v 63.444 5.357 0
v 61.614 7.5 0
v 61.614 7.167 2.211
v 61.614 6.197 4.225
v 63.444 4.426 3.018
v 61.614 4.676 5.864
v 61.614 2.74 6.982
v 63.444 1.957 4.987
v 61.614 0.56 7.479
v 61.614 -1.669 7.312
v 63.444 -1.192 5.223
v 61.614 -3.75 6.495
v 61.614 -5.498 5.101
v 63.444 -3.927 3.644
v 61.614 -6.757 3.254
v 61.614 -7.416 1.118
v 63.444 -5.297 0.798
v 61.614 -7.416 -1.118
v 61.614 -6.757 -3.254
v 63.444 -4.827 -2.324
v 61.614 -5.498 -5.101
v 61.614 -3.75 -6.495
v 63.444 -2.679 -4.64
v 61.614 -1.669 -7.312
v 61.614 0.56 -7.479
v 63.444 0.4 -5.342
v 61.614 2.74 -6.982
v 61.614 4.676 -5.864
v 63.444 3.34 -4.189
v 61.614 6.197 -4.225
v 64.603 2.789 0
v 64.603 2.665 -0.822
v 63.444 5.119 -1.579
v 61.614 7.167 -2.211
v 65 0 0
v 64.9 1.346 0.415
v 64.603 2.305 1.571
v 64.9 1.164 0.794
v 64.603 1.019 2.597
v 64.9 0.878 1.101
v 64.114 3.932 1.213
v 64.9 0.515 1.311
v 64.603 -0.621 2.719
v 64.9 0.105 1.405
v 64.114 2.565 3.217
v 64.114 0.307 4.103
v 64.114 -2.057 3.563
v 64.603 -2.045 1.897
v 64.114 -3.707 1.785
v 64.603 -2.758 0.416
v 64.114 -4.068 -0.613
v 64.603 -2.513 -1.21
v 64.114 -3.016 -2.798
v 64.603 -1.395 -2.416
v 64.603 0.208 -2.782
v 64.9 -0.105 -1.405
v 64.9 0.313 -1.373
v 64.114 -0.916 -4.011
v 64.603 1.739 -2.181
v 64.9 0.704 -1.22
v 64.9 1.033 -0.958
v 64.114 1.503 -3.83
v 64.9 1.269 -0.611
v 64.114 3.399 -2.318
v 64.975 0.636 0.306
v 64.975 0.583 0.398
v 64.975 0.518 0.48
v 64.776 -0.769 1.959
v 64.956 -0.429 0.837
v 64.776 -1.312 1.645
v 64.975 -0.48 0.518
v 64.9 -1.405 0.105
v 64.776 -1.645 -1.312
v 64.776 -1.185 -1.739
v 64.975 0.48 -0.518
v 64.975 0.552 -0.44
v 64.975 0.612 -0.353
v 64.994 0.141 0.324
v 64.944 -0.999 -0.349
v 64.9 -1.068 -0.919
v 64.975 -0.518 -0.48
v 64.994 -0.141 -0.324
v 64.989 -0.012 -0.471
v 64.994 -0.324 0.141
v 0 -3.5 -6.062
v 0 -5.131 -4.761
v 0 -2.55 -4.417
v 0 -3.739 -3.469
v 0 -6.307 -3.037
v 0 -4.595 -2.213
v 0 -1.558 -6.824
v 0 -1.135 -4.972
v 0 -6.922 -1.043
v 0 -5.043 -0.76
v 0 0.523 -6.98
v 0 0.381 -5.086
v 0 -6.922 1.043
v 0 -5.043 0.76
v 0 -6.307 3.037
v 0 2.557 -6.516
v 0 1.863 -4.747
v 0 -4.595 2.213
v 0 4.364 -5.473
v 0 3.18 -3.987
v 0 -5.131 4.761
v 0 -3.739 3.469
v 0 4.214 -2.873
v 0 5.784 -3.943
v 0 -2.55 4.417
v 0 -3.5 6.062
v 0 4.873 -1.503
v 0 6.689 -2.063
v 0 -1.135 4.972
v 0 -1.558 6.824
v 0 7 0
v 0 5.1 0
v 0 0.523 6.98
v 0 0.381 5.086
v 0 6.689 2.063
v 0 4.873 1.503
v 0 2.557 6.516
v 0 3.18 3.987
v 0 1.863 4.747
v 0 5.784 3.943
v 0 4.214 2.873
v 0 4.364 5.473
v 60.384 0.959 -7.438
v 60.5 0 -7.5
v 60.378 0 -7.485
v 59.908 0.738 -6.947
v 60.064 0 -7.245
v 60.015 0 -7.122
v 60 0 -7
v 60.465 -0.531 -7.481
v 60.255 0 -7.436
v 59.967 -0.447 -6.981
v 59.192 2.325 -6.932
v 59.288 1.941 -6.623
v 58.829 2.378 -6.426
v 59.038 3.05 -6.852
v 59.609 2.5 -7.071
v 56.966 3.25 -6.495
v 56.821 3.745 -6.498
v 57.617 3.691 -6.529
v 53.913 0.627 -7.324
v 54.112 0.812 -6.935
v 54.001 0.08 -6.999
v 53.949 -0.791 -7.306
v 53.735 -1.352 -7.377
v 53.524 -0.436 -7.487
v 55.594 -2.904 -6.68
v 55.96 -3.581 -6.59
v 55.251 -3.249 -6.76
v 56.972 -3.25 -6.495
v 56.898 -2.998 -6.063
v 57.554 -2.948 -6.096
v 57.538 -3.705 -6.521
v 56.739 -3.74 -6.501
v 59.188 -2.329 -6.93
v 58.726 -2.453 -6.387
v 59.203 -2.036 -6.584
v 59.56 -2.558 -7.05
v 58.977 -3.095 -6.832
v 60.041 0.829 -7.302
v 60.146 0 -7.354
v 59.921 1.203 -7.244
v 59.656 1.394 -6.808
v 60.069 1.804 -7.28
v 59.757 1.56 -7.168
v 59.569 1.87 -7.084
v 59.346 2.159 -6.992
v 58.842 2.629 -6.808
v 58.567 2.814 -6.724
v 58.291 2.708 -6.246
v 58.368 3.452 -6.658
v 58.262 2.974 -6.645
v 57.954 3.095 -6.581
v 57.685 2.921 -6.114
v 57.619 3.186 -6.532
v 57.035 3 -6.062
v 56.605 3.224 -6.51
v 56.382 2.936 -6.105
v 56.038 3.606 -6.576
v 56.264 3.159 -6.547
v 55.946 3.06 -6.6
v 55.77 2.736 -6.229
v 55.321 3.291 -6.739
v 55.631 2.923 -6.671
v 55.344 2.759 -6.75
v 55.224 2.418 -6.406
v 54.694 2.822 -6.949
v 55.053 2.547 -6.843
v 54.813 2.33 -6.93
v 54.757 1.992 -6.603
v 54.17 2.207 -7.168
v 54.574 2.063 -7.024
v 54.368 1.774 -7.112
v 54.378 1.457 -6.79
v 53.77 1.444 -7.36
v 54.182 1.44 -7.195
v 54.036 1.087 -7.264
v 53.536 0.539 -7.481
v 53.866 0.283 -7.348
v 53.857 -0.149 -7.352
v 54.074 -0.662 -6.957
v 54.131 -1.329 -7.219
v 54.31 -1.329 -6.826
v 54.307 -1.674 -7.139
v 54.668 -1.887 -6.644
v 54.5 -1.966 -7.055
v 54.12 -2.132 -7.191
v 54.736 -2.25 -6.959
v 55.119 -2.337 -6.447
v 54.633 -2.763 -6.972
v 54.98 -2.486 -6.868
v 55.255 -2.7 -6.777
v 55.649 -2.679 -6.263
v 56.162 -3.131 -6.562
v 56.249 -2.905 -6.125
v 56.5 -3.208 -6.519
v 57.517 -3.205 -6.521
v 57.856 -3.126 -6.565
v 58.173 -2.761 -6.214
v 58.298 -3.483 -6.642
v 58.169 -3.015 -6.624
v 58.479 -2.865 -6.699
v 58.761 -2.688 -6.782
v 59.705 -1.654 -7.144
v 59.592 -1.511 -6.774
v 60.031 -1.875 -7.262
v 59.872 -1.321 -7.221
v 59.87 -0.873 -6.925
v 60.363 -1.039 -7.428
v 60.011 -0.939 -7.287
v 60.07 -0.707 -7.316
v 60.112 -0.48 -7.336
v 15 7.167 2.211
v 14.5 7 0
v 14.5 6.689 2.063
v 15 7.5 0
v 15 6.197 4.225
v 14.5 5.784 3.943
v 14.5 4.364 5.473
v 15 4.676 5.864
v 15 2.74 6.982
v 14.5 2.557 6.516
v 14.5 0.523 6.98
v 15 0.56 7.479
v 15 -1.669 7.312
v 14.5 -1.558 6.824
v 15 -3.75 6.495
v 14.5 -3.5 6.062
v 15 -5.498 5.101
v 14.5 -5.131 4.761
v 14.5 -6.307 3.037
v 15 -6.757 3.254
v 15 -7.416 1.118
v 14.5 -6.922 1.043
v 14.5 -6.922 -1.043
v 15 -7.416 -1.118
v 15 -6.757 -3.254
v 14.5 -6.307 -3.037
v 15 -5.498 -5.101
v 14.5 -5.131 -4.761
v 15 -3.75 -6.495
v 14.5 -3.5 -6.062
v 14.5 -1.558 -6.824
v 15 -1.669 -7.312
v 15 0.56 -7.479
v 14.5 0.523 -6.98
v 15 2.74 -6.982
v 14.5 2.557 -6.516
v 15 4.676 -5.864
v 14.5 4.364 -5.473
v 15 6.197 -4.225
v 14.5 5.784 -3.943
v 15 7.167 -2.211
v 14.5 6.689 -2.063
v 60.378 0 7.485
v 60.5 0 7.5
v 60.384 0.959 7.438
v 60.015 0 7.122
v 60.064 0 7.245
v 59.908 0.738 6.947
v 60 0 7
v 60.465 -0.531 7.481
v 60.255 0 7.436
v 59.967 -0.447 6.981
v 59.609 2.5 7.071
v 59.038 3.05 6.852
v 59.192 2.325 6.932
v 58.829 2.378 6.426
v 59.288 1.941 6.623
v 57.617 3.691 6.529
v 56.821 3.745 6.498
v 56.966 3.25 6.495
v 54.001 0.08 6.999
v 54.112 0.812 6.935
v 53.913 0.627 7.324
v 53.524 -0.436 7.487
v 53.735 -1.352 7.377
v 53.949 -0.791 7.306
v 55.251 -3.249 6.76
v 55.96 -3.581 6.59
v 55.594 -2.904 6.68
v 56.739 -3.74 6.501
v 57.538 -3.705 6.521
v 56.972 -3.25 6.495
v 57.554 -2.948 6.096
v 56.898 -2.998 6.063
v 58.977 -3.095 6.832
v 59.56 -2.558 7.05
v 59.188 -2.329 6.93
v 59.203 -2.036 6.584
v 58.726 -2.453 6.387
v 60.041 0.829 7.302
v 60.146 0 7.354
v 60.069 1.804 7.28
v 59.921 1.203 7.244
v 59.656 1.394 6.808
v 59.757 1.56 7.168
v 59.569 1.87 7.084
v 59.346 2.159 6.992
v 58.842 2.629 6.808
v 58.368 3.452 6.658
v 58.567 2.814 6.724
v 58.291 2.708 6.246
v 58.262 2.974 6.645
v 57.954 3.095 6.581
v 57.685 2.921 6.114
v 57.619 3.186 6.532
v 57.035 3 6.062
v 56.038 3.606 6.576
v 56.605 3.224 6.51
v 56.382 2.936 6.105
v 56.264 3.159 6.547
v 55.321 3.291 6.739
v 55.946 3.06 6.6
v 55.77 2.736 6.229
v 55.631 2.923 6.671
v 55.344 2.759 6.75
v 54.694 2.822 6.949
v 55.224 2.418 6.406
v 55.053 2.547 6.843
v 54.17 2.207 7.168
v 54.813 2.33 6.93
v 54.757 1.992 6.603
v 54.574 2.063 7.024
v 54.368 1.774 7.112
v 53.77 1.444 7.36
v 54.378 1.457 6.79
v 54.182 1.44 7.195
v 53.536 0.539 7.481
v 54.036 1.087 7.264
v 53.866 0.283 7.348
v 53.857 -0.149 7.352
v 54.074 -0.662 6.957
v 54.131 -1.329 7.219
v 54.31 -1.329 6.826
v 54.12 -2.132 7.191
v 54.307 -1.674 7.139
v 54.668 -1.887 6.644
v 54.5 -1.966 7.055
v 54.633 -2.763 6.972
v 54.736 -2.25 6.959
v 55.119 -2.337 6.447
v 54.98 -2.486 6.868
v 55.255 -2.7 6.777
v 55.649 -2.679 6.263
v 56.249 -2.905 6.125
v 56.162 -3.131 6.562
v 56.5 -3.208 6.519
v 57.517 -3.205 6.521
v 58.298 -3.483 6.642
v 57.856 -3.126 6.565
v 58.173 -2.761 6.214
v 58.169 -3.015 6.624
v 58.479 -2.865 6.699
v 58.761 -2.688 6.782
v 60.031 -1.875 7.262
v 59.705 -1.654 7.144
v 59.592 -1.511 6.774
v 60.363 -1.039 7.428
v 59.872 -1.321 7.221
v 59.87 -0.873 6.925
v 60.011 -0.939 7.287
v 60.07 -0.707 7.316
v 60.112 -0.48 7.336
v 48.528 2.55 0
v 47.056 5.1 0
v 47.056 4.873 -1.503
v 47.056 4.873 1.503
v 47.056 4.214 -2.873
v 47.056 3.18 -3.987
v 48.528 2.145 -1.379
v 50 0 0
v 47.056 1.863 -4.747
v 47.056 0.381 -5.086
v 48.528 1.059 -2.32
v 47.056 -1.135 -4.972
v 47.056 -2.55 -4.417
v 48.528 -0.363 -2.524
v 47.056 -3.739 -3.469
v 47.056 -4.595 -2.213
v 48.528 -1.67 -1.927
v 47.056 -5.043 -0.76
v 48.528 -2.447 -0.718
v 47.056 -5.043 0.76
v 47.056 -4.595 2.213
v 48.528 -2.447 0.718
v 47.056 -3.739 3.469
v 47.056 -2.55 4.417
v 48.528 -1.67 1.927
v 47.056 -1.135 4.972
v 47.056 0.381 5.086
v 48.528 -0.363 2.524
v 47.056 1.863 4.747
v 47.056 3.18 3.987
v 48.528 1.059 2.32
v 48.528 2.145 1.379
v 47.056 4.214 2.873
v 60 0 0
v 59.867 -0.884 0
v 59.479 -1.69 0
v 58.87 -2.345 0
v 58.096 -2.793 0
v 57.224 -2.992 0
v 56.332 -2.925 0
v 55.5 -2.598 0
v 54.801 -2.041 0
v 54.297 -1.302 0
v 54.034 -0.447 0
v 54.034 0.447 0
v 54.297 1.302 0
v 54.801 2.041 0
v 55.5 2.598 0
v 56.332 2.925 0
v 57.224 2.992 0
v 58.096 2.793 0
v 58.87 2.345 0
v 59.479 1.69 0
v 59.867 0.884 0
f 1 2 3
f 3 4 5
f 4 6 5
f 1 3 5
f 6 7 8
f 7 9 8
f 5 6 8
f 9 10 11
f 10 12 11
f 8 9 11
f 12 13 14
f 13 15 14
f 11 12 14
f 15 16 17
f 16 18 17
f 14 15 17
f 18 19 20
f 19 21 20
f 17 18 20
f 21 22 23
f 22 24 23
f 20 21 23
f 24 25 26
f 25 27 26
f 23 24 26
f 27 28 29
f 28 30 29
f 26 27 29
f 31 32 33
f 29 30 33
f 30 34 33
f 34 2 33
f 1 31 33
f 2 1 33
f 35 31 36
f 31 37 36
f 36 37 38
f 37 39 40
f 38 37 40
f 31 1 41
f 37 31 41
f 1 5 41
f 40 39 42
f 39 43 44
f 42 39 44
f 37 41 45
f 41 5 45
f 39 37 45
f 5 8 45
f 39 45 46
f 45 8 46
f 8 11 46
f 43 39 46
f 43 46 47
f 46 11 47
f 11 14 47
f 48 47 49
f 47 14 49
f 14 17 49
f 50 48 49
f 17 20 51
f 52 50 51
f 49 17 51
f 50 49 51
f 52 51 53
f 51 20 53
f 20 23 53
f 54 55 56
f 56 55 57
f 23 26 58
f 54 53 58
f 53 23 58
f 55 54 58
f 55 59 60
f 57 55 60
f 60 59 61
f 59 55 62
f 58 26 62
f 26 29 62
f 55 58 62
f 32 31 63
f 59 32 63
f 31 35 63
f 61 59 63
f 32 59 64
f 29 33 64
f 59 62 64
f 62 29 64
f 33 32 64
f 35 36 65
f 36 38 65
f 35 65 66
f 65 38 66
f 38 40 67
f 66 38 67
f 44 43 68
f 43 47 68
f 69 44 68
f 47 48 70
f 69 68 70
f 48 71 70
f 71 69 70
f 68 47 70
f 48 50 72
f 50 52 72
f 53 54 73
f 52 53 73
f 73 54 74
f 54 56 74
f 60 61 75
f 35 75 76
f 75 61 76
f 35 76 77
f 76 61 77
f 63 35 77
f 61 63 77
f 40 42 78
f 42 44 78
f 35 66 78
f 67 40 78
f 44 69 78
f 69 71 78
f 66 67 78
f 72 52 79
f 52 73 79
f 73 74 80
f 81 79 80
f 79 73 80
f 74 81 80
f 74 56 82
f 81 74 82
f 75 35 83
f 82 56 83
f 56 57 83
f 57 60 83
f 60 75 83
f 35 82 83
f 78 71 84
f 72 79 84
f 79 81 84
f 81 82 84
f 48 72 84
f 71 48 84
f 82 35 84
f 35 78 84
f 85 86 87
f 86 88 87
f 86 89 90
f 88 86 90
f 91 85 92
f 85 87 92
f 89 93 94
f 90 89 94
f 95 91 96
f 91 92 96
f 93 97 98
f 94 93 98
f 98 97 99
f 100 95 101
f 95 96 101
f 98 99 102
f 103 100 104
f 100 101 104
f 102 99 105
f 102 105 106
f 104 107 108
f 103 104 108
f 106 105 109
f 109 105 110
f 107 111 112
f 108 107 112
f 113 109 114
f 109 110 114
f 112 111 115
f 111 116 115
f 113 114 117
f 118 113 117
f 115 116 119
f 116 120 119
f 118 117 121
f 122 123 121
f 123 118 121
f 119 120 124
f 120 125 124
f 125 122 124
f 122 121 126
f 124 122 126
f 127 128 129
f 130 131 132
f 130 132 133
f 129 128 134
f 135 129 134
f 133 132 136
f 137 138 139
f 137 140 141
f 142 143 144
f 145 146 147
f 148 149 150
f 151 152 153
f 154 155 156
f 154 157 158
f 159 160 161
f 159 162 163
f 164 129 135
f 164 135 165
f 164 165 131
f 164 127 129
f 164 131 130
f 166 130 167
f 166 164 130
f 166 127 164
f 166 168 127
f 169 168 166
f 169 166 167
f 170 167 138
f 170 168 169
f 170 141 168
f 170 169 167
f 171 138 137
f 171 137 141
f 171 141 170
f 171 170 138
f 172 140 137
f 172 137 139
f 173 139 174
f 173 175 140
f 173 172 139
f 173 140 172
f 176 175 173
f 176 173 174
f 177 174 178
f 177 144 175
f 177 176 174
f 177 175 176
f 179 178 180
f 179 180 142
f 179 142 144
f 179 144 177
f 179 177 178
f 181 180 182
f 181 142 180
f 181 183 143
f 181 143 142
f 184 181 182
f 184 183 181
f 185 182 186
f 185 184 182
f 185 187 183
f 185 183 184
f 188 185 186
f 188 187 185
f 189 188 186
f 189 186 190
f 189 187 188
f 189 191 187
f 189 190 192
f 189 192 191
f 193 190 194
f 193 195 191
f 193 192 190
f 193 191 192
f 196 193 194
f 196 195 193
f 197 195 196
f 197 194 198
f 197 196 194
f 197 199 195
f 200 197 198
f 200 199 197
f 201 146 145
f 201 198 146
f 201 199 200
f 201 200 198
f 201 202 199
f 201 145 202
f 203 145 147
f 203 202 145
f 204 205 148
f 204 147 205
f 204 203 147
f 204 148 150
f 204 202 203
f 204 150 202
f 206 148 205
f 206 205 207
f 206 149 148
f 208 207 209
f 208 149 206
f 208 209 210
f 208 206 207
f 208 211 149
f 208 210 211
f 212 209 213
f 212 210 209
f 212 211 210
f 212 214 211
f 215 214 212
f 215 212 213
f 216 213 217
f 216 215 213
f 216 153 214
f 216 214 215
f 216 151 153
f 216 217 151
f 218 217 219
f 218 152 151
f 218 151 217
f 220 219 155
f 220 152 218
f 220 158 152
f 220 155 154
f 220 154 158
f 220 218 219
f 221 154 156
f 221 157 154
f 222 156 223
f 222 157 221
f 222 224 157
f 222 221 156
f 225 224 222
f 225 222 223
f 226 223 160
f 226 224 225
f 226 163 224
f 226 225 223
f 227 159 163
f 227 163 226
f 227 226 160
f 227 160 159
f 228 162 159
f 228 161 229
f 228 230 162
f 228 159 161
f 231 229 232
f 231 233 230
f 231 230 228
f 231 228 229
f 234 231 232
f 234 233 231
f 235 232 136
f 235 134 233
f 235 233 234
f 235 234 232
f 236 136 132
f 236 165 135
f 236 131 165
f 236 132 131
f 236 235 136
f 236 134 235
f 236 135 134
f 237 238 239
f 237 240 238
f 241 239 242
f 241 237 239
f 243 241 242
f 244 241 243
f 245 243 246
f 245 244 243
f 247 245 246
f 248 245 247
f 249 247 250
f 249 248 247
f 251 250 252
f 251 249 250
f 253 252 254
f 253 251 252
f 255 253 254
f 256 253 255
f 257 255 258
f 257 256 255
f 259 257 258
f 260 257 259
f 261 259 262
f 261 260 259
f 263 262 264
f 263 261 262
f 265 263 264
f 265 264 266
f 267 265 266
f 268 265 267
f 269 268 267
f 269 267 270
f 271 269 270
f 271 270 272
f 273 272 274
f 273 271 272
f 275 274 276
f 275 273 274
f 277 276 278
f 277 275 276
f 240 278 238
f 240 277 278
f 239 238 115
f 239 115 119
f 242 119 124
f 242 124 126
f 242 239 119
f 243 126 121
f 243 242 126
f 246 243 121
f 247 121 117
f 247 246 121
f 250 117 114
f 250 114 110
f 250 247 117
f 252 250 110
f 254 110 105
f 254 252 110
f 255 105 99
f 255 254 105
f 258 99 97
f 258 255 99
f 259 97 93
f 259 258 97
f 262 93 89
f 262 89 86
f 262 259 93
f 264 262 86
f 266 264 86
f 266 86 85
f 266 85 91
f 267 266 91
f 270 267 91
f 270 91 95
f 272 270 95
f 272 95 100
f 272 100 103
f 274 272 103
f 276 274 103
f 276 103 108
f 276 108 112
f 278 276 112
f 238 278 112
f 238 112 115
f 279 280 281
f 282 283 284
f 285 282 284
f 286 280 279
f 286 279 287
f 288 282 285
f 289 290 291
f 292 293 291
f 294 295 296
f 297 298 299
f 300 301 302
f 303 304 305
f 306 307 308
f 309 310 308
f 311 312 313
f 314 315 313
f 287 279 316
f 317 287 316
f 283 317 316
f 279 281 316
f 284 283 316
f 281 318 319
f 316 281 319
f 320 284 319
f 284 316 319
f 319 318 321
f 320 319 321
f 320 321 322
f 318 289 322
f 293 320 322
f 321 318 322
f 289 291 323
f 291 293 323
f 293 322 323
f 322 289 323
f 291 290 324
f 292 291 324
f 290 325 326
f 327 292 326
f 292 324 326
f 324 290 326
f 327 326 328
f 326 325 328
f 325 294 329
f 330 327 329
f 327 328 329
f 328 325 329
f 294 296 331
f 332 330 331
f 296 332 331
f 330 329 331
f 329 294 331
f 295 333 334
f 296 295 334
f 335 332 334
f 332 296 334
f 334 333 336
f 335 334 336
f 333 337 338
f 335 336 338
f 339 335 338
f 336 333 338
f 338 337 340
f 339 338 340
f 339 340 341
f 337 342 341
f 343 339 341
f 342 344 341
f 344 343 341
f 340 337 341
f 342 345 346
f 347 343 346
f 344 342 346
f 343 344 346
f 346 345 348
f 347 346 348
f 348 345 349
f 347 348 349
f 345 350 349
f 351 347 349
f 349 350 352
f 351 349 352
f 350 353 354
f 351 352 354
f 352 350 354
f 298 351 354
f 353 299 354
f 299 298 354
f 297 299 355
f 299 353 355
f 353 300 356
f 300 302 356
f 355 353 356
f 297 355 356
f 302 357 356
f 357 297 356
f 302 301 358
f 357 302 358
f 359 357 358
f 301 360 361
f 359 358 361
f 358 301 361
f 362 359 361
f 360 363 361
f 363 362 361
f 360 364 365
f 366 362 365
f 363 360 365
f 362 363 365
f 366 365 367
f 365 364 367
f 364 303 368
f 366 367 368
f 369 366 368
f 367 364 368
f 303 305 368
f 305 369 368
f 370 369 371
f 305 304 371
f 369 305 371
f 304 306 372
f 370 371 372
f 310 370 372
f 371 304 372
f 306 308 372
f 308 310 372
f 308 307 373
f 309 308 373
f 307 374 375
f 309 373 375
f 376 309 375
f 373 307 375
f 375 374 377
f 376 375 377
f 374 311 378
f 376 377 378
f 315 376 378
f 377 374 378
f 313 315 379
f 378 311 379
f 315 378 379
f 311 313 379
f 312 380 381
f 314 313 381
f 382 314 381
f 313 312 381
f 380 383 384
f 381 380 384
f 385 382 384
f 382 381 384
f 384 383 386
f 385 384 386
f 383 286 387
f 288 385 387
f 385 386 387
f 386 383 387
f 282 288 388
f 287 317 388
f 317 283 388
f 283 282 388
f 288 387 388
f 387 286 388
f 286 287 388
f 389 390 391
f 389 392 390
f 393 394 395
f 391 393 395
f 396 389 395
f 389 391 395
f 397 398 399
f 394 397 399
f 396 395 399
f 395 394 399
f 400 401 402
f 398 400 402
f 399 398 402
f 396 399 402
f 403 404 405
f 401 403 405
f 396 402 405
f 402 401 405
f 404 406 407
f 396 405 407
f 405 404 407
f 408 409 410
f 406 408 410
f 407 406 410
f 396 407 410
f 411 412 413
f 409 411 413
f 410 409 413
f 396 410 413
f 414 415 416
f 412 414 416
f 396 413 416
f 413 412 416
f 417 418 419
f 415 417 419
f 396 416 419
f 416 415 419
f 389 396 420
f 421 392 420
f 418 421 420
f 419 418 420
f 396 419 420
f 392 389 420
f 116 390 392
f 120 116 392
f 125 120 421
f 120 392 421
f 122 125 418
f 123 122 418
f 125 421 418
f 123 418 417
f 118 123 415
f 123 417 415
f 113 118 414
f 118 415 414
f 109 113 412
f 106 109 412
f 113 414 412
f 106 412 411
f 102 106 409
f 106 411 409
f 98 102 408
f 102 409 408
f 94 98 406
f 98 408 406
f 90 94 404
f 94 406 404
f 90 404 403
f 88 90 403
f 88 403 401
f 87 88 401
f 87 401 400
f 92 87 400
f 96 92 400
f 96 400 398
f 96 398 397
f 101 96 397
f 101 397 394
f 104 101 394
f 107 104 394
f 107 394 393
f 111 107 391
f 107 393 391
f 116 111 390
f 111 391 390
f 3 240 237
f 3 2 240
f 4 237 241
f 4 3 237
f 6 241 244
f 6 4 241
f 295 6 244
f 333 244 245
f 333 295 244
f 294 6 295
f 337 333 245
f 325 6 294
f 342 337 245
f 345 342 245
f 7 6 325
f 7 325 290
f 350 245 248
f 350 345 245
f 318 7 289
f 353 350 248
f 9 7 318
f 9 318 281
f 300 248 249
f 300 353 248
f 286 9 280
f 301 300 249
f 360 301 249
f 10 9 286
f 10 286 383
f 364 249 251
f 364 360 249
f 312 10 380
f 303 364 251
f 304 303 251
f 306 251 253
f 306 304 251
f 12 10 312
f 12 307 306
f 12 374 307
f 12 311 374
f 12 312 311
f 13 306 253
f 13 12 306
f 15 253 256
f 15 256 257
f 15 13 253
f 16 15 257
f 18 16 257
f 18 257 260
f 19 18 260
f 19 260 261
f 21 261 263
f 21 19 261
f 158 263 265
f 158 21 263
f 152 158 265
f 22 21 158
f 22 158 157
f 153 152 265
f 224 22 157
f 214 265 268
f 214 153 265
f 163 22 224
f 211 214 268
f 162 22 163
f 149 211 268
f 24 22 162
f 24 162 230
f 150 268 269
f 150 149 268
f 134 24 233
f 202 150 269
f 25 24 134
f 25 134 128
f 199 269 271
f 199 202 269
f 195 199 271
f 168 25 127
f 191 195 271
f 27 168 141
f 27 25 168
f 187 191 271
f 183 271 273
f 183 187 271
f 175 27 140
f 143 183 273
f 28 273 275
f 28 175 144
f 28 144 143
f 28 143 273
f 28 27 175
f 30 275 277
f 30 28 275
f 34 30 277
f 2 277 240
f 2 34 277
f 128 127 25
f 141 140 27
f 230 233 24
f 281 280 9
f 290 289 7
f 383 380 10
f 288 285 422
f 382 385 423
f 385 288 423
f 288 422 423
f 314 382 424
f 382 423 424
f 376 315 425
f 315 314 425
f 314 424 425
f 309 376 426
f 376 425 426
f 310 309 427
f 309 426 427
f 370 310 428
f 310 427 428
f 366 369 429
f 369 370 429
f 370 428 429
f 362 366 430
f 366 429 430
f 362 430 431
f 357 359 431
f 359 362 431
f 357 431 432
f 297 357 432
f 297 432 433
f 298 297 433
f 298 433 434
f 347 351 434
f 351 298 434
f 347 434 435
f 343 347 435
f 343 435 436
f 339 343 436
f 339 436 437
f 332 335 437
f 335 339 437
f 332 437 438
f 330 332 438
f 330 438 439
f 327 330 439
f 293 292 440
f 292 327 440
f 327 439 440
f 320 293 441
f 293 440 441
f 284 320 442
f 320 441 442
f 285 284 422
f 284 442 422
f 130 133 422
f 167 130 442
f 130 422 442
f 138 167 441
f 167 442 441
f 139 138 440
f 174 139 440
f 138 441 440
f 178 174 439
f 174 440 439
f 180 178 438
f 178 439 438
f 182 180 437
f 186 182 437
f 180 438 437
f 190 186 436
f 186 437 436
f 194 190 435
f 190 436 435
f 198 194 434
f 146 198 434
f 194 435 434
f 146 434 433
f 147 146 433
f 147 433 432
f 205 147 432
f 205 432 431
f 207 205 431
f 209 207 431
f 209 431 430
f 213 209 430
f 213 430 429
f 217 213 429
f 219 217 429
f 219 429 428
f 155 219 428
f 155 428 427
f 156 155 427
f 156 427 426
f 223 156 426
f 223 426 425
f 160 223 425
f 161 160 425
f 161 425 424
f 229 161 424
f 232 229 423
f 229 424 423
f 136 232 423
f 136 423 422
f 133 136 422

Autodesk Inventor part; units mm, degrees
ref_plane "YZ Plane" through (0, 0, 0) normal (1, 0, 0) x (0, 1, 0)
ref_plane "XZ Plane" through (0, 0, 0) normal (0, 1, 0) x (-1, 0, 0)
ref_plane "XY Plane" through (0, 0, 0) normal (0, 0, 1) x (1, 0, 0)
sketch "Sketch1" plane through (0, 0, 0) normal (0, 0, 1) x (1, 0, 0)
  line L0 (-13.1614, 0) -> (78.9686, 0) projected
  line L1 (0, -5.1729) -> (0, 10.0373) projected
  line L2 (0, 7) -> (15, 7)
  line L3 (15, 7) -> (15, 7.5)
  line L4 (15, 7.5) -> (61.6144, 7.5)
  line L5 (61.6144, 7.5) -> (61.6144, 0) construction
  line L6 (0, 5.1) -> (47.0555, 5.1)
  line L7 (47.0555, 5.1) -> (50, 0)
  arc A0 (65, 0) -> (61.6144, 7.5) centre (55, 0) ccw
  circle A1 centre (57, 0) radius 3
  line L8 (15, 7.5) -> (14.5, 7)
  point P0 (0, 0)
  dimension "d0" = 10.2
  dimension "d2" = 14
  dimension "d3" = 15
  dimension "d5" = 60
  dimension "d6" = 50
  dimension "d8" = 15
  dimension "d9" = 10
  dimension "d10" = 6
  dimension "d12" = 65
  dimension "d13" = 0.5
  dimension "d14" = 0.5
  dimension "d15" = 57
revolve "Revolution1" add sketch "Sketch1" angle 360 about axis through (-10, 0, 0) along (1, 0, 0) picked at (56.166, 1.3672) contours A1 L0 L7 L6 L1 L2 L3 L4 A0 | L0 A1 | L3 L2 L8
extrude "Extrusion1" cut sketch "Sketch1" along normal through all both and the other way through all contours A1 L0 | L0 A1
fillet "Fillet1" radius 0.5 2 edges at (54, 0.0092, 7.5) (54, 0.0092, -7.5)
equation "\"d13\" = d14"
properties part number "TW1-004"
